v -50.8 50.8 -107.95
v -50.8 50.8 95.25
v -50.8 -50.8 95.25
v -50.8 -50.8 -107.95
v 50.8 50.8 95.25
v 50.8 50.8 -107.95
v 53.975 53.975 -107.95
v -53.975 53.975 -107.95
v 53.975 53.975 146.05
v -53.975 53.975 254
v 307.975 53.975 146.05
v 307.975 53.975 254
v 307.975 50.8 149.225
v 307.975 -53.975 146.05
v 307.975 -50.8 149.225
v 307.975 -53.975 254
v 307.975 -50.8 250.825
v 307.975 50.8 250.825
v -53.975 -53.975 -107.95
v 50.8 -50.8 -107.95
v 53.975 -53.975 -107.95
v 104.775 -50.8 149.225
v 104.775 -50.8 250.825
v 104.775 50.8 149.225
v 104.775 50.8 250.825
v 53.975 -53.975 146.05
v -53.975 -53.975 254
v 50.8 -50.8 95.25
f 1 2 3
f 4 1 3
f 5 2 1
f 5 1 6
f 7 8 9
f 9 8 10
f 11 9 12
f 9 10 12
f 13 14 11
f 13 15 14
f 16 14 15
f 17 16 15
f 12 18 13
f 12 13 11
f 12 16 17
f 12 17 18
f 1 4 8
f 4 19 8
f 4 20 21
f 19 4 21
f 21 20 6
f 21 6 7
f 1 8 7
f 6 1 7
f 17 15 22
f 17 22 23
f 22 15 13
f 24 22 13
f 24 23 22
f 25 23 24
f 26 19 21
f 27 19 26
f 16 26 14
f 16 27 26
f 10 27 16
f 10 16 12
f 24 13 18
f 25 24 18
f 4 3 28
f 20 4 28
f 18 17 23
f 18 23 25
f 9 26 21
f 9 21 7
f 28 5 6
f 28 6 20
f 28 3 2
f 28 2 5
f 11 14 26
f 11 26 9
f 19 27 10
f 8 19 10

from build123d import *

# Parameters (mm, degrees)
F0_W     = 107.95
F0_H     = 107.95
F1_DEPTH = 254
F2_W     = 107.95
F2_H     = 107.95
F3_DEPTH = 254
F4_DEPTH = 107.95
F5_W     = 101.6
F5_H     = 101.6
F6_DEPTH = 203.2
F7_W     = 101.6
F7_H     = 101.6
F8_DEPTH = 203.2


with BuildPart() as f1:
    # F0 (on Top) → F1 (new body)
    with BuildSketch(Plane.XY):
        Rectangle(F0_W, F0_H)
    extrude(amount=F1_DEPTH)

    # F2 (on face) → F3 (join)
    with BuildSketch(Plane.YZ.offset(53.975)):
        with Locations((0, 200.025)):
            Rectangle(F2_W, F2_H)
    extrude(amount=F3_DEPTH)

    # F4 (add): a face of the model
    f4_faces = [f1.faces().sort_by_distance(p)[0] for p in [
        (0, 0, 0),
    ]]
    extrude(f4_faces, amount=F4_DEPTH)

    # F5 (on face) → F6 (cut)
    with BuildSketch(Plane(origin=(0, 0, -107.95), x_dir=(1, 0, 0), z_dir=(0, 0, -1))):
        Rectangle(F5_W, F5_H)
    extrude(amount=-F6_DEPTH, mode=Mode.SUBTRACT)

    # F7 (on face) → F8 (cut)
    with BuildSketch(Plane.YZ.offset(307.975)):
        with Locations((0, 200.025)):
            Rectangle(F7_W, F7_H)
    extrude(amount=-F8_DEPTH, mode=Mode.SUBTRACT)


solid = f1.part
